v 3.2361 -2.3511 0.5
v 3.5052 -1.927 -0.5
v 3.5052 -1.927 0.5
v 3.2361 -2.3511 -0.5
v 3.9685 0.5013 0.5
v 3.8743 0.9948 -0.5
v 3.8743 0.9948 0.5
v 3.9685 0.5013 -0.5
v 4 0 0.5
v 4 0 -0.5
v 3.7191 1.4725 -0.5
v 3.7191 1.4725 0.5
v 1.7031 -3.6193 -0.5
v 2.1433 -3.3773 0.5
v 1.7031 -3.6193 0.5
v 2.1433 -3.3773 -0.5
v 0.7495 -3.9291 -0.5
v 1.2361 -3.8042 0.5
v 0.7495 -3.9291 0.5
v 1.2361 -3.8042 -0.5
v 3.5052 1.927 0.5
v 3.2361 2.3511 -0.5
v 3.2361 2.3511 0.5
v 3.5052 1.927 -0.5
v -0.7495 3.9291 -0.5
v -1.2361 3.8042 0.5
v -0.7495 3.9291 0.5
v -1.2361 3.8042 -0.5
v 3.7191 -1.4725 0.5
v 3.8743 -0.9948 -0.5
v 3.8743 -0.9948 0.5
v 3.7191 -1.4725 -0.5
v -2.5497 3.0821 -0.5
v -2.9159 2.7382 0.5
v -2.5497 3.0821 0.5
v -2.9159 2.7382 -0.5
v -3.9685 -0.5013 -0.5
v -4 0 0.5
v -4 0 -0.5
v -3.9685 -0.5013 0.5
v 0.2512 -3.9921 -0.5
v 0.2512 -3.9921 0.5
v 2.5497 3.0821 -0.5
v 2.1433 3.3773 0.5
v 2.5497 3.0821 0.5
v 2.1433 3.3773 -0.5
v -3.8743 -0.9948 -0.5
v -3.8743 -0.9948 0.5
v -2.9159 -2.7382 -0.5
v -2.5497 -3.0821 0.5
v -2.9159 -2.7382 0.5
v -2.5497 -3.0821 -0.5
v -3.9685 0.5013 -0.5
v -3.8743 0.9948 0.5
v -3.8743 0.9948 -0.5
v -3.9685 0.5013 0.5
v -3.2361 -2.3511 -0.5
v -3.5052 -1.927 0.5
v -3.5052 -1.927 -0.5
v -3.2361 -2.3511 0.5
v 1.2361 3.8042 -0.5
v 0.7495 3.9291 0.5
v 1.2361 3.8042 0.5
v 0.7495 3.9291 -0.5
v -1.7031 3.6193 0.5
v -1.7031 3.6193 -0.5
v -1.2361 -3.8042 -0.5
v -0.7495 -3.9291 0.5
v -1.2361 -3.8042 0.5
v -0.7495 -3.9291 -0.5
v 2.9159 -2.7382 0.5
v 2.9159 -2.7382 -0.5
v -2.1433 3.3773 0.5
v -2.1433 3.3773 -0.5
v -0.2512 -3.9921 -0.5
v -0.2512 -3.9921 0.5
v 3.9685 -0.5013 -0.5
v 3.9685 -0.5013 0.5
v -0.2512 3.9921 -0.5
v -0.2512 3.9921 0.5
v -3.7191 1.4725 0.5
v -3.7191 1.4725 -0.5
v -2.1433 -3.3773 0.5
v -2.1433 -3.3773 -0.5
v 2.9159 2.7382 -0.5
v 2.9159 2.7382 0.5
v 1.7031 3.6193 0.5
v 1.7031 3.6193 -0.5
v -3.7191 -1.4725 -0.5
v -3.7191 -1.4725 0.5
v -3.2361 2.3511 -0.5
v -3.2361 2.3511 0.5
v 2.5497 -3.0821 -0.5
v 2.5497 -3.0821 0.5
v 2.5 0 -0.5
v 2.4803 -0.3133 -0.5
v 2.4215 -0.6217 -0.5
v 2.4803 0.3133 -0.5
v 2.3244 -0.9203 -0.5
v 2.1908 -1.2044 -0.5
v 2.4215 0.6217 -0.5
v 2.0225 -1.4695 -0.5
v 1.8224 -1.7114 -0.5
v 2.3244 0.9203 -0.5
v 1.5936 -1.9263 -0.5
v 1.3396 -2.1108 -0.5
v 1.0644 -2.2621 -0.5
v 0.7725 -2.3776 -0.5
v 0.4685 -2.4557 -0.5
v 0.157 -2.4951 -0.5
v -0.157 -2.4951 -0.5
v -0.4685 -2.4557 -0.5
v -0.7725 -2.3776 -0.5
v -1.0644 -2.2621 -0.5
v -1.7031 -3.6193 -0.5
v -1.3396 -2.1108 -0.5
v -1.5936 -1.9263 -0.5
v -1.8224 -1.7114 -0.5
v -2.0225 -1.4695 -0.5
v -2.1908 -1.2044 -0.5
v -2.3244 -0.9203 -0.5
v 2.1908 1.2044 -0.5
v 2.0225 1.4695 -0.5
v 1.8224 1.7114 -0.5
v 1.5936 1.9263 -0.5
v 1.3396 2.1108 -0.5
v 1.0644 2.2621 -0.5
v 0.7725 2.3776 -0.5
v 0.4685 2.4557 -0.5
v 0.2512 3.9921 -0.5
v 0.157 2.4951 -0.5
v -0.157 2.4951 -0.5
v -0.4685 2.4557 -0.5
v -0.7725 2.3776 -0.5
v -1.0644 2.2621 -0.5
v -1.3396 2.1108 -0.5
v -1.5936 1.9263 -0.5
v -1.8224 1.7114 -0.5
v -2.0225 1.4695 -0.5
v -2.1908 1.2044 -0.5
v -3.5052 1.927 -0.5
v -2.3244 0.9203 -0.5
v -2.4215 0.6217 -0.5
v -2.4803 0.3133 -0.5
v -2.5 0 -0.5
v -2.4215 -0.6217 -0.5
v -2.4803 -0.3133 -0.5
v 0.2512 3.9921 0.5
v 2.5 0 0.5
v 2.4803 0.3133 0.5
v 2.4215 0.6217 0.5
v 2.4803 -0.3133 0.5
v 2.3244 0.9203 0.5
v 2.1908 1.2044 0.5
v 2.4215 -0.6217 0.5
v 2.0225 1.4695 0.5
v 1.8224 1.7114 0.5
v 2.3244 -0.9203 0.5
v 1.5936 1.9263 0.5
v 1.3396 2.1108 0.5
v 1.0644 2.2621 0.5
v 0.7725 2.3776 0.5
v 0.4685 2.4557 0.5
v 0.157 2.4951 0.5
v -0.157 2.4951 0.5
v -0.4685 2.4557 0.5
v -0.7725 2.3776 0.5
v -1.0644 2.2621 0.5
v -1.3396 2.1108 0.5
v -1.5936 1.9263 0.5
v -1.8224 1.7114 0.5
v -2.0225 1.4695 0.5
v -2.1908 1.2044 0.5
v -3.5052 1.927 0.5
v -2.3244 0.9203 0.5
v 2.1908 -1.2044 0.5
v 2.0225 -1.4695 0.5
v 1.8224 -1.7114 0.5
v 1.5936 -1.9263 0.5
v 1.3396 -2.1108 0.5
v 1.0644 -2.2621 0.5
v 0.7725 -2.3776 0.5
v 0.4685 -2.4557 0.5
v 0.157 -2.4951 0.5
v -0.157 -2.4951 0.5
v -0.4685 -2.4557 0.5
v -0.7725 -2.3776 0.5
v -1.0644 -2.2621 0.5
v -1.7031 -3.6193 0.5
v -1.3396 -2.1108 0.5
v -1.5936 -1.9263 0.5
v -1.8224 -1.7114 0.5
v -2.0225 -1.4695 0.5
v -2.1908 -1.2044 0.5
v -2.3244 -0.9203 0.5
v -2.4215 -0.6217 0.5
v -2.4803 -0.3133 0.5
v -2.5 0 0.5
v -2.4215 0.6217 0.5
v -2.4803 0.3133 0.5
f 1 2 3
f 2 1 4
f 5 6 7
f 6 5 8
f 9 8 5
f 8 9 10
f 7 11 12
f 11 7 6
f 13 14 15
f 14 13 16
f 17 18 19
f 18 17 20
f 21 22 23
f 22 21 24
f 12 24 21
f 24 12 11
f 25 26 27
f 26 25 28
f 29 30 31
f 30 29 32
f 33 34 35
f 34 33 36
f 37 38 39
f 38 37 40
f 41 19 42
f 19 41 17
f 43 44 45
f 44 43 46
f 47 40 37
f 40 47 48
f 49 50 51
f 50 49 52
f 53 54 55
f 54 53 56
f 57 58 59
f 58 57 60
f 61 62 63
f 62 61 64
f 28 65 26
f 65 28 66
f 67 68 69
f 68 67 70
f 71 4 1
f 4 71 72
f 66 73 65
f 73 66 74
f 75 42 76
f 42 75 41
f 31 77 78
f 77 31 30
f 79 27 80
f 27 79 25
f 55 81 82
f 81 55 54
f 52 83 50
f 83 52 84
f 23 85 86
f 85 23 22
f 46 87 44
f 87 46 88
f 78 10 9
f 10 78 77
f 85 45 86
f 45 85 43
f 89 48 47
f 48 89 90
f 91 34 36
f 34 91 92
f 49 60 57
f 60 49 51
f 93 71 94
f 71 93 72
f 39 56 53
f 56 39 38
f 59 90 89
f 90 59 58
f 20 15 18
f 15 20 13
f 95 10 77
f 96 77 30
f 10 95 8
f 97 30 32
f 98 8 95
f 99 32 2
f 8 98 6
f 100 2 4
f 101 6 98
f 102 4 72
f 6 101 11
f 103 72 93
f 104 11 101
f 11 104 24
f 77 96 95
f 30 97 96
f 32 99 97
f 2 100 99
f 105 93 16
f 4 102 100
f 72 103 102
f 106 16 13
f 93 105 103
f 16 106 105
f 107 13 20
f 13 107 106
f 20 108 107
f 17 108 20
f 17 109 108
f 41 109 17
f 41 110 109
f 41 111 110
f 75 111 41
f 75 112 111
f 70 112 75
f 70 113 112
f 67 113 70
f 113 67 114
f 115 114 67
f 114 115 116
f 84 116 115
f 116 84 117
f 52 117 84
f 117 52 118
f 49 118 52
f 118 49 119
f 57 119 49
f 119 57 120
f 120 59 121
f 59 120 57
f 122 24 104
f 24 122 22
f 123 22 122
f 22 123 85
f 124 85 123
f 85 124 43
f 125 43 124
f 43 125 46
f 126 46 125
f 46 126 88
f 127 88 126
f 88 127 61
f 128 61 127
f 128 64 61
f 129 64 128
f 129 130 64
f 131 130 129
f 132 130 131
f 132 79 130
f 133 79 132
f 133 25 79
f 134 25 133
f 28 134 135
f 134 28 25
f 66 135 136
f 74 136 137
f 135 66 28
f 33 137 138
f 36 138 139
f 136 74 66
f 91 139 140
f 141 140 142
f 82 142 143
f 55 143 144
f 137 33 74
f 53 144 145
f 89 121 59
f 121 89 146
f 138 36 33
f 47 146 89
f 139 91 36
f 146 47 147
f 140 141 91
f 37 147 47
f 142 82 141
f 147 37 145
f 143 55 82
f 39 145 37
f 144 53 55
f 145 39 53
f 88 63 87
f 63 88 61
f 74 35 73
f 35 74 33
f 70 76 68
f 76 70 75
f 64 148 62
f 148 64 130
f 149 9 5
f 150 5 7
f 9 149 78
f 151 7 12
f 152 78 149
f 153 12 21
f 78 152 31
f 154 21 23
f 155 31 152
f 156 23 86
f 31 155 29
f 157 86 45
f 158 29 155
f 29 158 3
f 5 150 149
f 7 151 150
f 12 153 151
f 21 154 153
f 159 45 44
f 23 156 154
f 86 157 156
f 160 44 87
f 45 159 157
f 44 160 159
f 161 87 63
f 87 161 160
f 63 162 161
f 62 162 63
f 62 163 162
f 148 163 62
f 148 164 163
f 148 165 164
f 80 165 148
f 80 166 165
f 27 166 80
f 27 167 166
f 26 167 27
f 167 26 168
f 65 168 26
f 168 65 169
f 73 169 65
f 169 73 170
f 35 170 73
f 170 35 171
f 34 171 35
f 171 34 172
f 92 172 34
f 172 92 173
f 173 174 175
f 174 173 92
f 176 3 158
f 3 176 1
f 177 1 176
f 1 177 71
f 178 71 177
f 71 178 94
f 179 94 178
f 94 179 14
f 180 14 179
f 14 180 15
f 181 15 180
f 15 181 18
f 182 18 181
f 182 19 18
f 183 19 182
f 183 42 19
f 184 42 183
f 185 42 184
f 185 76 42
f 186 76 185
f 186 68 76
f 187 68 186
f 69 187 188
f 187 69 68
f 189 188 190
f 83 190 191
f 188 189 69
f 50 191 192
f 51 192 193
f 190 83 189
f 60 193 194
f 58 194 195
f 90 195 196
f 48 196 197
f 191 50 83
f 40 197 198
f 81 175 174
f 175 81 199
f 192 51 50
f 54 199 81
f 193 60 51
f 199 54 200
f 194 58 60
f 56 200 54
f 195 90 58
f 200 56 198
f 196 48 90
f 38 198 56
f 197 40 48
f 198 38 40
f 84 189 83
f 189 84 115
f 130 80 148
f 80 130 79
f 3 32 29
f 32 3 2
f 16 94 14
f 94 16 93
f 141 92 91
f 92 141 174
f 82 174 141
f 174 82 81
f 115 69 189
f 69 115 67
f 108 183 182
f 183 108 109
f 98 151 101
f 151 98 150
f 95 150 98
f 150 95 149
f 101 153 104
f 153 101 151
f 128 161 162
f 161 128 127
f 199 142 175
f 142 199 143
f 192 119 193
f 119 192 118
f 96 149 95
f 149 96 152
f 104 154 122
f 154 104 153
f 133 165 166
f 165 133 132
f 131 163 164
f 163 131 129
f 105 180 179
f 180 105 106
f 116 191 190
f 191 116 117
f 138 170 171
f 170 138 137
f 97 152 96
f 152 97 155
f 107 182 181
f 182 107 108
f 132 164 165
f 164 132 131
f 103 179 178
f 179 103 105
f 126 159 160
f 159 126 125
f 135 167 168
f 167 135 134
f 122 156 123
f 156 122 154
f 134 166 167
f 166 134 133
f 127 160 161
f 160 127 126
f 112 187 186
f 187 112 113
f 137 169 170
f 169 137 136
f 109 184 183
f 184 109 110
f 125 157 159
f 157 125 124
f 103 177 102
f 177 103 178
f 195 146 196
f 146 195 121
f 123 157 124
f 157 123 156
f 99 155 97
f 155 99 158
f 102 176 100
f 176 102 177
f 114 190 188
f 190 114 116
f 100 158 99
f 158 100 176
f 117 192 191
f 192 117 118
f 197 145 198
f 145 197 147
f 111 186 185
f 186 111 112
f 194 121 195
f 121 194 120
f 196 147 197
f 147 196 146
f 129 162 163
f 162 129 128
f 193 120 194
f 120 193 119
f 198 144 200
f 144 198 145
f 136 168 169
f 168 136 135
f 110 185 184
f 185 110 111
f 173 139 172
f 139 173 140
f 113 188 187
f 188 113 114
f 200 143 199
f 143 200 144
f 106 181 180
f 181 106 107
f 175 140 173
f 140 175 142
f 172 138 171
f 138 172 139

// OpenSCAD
$fn = 50;


difference() {
	union() {
		translate(v = [0, 0, -0.5000000000]) {
			cylinder(h = 1, r = 4.0000000000);
		}
	}
	union() {
		translate(v = [0, 0, -100.0000000000]) {
			cylinder(h = 200, r = 2.5000000000);
		}
	}
}
